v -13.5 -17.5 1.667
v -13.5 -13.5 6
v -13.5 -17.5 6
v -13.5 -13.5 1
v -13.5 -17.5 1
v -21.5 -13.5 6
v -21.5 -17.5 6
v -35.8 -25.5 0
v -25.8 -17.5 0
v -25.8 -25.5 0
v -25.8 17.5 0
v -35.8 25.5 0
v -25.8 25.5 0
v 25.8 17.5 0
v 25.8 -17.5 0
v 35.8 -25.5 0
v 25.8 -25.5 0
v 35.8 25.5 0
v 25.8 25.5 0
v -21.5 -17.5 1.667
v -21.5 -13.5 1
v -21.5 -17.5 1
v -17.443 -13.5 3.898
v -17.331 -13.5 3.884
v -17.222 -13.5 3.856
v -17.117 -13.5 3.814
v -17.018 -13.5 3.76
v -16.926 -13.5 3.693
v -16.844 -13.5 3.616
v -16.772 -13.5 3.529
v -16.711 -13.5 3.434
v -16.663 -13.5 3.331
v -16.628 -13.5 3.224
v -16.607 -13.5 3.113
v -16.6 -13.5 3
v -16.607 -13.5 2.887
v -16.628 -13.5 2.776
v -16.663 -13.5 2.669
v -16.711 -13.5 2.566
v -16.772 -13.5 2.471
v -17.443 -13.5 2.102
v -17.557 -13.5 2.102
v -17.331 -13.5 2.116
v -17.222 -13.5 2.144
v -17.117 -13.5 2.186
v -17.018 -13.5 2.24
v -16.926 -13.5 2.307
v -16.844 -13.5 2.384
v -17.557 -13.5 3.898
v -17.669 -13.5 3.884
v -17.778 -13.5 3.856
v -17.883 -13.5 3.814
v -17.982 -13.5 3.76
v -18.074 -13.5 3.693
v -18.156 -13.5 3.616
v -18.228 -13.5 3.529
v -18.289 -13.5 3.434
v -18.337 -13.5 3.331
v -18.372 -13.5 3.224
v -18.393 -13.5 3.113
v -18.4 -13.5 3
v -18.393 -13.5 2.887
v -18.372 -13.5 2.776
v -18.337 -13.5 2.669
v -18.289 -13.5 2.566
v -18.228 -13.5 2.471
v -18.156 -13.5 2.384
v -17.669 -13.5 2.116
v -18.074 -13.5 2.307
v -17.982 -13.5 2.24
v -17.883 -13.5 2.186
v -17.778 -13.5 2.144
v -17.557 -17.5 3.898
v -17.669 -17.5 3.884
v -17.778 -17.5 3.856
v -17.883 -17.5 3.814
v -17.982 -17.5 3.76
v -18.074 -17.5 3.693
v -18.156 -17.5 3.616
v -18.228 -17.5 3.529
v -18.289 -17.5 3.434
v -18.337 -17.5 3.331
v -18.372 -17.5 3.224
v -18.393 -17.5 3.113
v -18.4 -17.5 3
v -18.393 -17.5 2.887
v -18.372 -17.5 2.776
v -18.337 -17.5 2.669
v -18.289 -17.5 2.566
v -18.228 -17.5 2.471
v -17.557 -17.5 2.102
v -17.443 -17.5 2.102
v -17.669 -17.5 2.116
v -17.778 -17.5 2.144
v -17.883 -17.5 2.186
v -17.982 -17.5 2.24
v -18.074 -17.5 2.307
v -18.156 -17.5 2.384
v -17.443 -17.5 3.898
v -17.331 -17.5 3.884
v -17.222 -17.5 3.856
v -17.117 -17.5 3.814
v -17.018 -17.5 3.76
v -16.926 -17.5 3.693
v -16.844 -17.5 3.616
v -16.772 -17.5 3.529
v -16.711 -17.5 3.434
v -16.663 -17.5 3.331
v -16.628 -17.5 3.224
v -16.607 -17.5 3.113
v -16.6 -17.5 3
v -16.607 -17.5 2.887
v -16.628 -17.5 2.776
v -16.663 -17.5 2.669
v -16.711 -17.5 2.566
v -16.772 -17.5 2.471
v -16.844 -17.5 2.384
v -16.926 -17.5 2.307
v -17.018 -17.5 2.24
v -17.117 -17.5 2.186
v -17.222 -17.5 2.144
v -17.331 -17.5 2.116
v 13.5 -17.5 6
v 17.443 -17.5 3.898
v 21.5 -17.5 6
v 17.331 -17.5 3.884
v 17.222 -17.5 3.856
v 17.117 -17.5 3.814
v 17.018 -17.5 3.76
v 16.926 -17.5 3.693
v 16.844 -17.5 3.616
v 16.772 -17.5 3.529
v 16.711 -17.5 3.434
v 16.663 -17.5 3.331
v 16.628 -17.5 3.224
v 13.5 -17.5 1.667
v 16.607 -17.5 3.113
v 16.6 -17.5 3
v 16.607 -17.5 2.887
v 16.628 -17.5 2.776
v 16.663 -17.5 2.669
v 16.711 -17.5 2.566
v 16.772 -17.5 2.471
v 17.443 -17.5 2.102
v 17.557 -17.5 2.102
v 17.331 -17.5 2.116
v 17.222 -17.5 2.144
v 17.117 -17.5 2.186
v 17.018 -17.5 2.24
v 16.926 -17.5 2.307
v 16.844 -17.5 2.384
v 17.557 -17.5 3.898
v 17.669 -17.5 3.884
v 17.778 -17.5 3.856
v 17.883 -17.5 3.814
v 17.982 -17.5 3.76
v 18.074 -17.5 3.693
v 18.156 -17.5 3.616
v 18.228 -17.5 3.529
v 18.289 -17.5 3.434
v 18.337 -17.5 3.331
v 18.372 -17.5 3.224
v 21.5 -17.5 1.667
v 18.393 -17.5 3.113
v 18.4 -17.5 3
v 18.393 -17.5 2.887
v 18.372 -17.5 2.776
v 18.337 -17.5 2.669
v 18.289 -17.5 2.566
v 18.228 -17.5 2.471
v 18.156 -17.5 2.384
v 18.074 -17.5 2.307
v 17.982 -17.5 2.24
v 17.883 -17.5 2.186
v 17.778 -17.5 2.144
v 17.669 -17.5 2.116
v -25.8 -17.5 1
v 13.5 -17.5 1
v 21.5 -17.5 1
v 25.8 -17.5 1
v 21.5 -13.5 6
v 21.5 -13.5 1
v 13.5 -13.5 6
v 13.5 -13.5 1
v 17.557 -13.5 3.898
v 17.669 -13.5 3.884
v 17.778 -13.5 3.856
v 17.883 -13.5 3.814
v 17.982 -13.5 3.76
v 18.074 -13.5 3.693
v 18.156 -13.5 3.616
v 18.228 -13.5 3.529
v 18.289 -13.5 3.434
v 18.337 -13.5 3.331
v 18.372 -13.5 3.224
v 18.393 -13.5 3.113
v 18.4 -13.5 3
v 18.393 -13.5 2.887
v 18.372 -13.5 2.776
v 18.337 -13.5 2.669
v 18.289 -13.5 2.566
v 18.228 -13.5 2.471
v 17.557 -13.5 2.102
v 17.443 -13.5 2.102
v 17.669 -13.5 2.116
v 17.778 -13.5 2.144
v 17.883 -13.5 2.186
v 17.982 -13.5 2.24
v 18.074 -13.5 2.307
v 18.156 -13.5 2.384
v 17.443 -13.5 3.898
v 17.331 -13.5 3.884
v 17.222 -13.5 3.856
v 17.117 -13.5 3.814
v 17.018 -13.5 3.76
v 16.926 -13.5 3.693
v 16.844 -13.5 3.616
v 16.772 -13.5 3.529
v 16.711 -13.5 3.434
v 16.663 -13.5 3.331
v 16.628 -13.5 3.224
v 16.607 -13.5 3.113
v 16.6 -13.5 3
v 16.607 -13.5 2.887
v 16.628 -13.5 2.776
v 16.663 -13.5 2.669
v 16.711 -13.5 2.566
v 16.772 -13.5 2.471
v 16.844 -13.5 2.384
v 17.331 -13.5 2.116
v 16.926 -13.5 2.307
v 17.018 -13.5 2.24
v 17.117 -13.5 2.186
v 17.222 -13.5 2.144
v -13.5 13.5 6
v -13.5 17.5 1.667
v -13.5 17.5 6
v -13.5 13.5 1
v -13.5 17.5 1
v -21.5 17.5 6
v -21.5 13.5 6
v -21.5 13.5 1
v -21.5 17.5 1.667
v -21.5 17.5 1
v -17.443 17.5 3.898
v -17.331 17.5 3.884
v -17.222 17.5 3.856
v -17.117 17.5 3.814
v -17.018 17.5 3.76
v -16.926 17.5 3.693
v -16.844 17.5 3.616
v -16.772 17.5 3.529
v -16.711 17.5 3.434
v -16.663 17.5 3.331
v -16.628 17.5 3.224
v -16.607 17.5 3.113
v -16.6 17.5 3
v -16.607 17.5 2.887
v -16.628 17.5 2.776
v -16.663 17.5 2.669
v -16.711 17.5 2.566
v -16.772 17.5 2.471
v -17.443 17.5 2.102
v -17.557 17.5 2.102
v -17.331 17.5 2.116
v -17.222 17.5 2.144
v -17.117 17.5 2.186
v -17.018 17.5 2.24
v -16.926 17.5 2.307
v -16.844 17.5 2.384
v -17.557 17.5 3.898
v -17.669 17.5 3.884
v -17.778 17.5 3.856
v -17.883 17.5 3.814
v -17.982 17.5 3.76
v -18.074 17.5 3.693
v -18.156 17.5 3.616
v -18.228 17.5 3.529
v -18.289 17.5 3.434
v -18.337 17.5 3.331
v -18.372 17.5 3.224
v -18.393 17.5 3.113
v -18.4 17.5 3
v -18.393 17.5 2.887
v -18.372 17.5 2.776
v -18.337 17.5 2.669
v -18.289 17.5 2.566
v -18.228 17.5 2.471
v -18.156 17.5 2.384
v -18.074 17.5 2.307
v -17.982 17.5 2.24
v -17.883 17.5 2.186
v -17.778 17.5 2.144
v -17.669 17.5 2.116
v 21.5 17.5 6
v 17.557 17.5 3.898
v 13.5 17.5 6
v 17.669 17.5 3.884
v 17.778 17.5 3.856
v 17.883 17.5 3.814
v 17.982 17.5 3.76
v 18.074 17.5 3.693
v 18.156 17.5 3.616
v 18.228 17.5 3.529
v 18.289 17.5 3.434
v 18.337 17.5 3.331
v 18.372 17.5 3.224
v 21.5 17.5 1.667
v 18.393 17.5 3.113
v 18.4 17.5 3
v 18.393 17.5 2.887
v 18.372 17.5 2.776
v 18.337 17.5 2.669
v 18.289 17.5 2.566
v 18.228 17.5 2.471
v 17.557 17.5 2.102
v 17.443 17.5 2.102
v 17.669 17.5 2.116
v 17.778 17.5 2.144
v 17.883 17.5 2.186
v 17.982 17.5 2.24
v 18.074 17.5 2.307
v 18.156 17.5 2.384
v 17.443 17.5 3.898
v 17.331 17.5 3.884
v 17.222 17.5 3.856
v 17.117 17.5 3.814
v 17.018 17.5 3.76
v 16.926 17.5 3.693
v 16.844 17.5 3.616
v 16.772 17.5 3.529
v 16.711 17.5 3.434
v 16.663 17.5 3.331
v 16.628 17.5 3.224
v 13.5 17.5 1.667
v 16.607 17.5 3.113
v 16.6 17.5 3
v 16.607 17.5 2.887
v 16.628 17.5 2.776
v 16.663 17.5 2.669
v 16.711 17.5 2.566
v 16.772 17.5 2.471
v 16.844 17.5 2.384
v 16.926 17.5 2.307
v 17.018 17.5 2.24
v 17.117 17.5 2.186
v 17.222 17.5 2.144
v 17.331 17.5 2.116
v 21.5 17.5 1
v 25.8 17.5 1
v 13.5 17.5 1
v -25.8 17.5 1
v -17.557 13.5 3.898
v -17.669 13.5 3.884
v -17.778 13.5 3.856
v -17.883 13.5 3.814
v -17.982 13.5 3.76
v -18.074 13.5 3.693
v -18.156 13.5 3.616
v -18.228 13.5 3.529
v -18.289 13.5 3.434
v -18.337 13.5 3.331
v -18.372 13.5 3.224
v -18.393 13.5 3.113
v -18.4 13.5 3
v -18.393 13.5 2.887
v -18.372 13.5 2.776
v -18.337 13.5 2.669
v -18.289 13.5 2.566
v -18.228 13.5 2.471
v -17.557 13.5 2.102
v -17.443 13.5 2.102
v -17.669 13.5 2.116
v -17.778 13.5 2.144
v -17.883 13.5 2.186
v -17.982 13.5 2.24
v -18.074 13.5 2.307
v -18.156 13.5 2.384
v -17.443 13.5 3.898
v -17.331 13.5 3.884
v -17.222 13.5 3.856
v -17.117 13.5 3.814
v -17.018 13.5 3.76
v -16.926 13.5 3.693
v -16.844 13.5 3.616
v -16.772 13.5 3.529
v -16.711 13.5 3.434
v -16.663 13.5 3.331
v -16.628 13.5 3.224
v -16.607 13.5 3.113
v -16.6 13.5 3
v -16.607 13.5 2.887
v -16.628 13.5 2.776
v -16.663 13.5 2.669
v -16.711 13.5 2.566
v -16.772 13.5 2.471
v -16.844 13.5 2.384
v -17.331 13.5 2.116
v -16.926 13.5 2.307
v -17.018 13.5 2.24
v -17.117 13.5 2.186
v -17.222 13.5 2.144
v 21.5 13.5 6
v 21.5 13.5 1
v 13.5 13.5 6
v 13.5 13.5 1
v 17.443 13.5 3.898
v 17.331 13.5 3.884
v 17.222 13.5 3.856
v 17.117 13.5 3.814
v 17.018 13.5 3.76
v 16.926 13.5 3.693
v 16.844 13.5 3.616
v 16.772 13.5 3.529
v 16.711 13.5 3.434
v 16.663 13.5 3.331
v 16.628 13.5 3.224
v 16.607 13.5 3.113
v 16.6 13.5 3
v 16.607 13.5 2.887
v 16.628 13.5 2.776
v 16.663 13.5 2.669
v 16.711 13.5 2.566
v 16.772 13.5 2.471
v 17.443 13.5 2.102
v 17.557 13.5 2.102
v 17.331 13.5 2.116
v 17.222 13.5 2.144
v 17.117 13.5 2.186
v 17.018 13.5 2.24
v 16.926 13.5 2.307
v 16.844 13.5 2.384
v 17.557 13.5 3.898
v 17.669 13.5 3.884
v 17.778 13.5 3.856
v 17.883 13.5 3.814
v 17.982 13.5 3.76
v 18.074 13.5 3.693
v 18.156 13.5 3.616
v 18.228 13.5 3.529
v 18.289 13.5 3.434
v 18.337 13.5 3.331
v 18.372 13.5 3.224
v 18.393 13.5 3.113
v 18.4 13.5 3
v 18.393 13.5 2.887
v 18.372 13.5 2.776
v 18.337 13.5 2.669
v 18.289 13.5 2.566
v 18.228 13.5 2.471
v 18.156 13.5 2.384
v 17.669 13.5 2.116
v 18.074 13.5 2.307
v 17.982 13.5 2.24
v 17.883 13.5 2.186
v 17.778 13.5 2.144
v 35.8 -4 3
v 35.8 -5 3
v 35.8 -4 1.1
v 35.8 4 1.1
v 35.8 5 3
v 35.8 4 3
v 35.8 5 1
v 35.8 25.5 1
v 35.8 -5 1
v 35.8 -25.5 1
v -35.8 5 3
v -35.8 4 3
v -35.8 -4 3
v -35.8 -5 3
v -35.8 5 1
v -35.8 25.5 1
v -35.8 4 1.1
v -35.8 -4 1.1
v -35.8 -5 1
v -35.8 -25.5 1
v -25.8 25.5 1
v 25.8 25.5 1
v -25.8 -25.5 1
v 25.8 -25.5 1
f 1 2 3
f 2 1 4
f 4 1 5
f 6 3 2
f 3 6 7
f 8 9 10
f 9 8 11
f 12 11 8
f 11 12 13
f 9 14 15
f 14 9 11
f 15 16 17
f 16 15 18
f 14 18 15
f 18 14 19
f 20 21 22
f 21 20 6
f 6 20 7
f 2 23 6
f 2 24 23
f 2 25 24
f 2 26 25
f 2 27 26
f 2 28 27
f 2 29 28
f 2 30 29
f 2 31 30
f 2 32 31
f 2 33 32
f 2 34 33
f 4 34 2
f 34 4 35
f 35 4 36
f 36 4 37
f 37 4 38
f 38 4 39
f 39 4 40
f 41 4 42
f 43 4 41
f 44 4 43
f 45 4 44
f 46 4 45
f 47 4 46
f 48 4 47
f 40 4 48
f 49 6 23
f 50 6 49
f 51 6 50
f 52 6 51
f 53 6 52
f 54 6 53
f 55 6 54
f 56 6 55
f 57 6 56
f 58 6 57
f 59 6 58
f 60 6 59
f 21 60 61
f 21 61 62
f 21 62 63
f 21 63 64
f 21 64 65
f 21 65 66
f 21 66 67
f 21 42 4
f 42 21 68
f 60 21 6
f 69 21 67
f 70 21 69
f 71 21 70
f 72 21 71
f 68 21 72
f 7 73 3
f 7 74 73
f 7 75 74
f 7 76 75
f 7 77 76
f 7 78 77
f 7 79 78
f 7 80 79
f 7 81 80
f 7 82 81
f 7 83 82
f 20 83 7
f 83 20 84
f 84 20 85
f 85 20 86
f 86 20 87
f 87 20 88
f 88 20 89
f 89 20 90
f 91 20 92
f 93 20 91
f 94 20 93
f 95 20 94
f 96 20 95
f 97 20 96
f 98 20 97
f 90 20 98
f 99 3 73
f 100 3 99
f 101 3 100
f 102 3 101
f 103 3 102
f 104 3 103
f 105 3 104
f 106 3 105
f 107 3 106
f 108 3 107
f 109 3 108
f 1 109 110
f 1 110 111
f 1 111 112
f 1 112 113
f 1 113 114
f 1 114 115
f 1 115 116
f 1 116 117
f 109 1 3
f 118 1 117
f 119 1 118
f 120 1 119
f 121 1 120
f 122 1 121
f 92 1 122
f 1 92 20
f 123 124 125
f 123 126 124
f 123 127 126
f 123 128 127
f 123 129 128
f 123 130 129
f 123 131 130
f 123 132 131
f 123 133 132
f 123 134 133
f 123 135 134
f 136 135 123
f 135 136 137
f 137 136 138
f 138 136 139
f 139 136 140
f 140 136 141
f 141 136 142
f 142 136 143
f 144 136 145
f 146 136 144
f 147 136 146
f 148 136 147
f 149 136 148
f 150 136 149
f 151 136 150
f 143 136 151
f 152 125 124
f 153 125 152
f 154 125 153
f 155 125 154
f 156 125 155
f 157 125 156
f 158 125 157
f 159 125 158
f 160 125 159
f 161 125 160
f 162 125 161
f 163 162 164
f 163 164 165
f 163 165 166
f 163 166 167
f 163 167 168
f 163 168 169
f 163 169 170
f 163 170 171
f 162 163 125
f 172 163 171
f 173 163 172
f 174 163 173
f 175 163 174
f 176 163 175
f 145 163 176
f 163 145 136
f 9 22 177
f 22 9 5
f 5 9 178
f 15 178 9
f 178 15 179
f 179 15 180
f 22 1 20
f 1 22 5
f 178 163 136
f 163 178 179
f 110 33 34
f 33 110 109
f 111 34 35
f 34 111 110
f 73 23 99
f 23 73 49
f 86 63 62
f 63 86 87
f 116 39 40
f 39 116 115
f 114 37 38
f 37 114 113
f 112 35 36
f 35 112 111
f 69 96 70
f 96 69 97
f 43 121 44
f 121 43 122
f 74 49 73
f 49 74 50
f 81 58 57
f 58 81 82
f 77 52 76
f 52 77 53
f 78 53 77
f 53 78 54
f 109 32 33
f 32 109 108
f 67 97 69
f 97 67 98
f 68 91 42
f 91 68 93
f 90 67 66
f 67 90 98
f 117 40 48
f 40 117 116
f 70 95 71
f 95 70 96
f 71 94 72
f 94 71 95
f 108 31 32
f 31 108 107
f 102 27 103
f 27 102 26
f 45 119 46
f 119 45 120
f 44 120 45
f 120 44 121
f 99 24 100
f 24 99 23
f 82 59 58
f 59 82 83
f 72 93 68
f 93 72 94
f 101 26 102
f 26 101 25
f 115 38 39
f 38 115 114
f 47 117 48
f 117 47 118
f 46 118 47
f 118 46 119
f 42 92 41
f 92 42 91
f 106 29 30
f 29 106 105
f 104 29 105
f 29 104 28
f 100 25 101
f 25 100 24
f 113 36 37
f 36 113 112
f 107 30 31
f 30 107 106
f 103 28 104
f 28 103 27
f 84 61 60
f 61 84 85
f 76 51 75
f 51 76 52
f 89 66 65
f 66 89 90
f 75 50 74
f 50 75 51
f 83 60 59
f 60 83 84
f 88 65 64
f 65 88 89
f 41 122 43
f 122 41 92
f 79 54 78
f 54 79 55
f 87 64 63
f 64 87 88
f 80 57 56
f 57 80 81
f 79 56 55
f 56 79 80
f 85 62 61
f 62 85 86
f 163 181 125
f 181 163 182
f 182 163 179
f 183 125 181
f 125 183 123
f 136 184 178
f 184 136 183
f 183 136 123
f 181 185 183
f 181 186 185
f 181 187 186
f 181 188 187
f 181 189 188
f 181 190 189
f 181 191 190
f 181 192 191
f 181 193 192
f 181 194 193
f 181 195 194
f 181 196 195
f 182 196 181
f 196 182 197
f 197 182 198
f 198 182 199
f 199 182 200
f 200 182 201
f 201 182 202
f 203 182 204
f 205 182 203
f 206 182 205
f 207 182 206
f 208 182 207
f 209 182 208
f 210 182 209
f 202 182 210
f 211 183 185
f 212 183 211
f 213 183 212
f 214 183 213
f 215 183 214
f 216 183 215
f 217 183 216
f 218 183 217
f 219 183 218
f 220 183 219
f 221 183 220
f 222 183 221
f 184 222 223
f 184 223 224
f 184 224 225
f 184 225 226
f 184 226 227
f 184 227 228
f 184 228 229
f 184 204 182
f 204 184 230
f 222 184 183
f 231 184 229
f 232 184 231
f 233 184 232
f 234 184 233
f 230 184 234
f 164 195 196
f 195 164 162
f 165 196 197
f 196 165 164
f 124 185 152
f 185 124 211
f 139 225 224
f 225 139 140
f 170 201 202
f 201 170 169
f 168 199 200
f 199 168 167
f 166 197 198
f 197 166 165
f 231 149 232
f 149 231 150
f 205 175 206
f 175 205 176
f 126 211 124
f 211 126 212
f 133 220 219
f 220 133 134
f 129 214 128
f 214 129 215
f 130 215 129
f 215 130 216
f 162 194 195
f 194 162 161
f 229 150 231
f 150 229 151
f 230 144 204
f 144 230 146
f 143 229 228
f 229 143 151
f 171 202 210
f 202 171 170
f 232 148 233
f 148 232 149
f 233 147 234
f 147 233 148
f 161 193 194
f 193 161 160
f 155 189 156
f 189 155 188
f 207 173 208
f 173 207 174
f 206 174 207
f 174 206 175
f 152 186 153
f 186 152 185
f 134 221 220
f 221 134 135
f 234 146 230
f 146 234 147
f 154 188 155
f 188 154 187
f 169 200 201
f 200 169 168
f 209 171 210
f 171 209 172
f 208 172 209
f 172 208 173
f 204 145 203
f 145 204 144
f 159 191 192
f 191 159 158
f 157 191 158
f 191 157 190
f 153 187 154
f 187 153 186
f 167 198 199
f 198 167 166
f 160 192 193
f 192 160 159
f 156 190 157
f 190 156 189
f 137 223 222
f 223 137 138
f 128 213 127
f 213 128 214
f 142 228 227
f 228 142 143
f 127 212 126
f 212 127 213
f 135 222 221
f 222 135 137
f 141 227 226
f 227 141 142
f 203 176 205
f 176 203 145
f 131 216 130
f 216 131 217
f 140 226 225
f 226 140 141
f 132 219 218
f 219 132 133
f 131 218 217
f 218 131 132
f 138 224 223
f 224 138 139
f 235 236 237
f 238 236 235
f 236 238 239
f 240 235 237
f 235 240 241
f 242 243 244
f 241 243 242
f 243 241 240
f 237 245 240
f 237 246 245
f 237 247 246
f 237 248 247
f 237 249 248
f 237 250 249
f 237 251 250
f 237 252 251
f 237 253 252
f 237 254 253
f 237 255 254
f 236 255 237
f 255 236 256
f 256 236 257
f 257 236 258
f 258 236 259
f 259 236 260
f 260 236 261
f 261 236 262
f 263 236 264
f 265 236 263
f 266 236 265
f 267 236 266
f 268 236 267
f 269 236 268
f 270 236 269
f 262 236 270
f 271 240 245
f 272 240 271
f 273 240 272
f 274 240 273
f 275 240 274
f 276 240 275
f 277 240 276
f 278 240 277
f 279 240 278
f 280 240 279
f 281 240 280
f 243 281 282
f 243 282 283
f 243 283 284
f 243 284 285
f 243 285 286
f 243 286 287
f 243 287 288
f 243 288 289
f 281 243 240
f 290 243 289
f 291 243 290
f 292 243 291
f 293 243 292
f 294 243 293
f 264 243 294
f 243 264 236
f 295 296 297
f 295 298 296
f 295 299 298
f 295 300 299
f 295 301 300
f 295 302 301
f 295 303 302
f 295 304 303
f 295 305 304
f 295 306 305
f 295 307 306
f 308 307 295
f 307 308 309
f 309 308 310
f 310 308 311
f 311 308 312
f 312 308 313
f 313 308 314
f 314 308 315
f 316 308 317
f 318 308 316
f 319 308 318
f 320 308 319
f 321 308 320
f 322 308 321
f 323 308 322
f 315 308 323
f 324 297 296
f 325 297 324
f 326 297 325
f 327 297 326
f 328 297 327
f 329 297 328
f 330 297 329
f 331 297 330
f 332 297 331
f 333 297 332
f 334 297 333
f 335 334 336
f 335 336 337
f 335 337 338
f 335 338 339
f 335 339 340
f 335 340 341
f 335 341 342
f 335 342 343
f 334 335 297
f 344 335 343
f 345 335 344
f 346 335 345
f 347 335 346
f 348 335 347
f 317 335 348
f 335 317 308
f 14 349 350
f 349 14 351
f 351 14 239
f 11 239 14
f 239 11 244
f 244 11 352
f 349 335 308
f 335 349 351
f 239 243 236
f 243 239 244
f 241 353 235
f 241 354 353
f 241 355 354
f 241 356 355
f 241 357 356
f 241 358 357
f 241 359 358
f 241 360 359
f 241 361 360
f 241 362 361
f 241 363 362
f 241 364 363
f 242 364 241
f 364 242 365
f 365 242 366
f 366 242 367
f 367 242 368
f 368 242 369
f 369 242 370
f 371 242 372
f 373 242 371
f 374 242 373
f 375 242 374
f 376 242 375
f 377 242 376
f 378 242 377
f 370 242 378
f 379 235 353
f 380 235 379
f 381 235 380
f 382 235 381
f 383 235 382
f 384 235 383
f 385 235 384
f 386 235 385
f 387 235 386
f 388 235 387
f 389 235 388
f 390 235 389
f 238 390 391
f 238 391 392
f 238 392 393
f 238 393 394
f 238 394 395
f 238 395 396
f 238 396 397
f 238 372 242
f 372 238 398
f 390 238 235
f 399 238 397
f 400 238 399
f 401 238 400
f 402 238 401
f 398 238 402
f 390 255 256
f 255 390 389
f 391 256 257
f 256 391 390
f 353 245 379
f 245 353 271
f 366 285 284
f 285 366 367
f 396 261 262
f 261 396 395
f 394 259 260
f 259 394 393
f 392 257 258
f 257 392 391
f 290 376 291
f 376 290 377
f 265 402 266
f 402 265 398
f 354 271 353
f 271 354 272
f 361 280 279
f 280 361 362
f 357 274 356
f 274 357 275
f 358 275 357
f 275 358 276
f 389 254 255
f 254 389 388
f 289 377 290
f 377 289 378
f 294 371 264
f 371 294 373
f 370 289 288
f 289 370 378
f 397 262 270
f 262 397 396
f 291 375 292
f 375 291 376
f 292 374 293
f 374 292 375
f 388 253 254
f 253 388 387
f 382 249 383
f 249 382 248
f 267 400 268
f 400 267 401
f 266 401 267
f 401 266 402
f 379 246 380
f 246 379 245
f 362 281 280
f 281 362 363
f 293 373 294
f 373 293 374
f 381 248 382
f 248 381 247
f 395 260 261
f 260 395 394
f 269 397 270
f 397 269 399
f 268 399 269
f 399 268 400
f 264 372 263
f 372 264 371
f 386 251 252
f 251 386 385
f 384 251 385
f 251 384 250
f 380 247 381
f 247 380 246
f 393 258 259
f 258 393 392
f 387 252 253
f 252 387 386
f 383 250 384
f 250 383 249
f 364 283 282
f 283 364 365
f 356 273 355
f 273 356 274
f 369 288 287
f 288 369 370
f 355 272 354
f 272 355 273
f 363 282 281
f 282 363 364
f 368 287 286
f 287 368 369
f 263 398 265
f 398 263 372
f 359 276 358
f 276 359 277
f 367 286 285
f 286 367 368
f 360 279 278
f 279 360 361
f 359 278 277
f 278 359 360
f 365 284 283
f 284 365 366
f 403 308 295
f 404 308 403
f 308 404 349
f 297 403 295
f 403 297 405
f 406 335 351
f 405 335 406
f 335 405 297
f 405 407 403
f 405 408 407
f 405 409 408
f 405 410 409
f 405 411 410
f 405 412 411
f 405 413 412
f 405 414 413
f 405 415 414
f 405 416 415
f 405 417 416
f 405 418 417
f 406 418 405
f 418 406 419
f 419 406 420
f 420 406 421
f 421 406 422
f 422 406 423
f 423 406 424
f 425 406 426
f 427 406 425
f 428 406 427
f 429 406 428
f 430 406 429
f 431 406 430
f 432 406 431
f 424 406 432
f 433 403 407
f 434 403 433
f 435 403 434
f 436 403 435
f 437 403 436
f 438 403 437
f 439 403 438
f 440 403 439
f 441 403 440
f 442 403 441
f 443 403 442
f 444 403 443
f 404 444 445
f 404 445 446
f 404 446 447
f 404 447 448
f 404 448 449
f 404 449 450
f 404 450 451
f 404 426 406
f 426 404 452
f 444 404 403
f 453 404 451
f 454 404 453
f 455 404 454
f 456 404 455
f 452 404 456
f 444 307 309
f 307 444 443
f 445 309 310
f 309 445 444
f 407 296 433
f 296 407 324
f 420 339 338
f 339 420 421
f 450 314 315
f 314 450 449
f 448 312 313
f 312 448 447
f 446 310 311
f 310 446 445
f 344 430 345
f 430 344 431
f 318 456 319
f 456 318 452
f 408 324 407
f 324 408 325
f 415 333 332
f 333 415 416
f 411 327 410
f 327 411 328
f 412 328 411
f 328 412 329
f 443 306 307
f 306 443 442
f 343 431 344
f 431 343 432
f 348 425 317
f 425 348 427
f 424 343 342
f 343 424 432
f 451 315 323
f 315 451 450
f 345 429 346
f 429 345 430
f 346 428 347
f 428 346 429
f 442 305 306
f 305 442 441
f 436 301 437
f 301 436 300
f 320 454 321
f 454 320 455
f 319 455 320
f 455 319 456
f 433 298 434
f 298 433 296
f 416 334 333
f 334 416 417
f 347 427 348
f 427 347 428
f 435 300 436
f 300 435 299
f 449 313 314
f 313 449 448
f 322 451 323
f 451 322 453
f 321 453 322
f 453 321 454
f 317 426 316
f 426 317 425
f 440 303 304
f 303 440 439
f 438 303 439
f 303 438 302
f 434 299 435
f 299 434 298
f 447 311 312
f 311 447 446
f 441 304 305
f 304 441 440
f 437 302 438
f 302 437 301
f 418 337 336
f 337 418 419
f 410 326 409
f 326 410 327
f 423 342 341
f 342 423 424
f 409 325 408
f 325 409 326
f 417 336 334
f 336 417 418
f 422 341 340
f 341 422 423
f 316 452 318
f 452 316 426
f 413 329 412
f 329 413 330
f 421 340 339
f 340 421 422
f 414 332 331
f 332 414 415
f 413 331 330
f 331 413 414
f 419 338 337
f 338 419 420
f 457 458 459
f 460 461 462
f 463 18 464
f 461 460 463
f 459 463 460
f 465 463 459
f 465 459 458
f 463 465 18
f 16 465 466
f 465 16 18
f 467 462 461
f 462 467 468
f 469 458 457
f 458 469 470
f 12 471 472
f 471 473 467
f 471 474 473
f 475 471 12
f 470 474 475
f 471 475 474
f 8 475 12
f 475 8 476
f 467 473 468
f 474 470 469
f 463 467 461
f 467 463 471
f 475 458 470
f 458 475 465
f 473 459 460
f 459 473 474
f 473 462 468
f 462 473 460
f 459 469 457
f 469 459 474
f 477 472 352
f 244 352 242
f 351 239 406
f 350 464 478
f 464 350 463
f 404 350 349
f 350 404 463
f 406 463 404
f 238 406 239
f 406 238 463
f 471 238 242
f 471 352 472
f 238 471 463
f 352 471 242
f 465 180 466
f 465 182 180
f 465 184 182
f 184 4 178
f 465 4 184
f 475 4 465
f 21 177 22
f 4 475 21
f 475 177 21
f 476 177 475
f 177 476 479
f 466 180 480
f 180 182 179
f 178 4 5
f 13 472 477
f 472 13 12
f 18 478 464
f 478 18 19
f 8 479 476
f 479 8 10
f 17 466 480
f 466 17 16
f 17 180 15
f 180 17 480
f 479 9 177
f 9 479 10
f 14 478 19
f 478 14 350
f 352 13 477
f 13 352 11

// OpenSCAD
base_inner=51.6;
base_head_w=10;
base_head_h=8;
base_h=1;
base_w=51;
base_l=base_inner+2*base_head_w;

gorb_h = 2;
gorb_s = 1;
gorb_w = 8+gorb_s*2;

kat_h = 6;
kat_w = 8;
kat_g = 4;

add = 1;

pok = 27;
hole_r = 0.9;

$fn=50;

difference() {
	//main body
	union() {
		//base
		translate([-base_l/2,-base_w/2,0]) 
			cube([base_l, base_w ,base_h]);
			

		translate([-pok/2-kat_w,-base_w/2+base_head_h,0]) 
			difference() {
				cube([kat_w, kat_g ,kat_h]);
				translate([kat_w/2,kat_g/2,kat_h/2]) rotate(a=[90,0,0])
					 cylinder(h=kat_g+2, r=hole_r, center = true);

			}	
		translate([pok/2,-base_w/2+base_head_h,0]) 
			difference() {
				cube([kat_w, kat_g ,kat_h]);
				translate([kat_w/2,kat_g/2,kat_h/2]) rotate(a=[90,0,0])
					 cylinder(h=kat_g+2, r=hole_r, center = true);

			}	

		translate([-pok/2-kat_w,base_w/2-base_head_h-kat_g,0]) 
			difference() {
				cube([kat_w, kat_g ,kat_h]);
				translate([kat_w/2,kat_g/2,kat_h/2]) rotate(a=[90,0,0])
					 cylinder(h=kat_g+2, r=hole_r, center = true);

			}	
		translate([pok/2,base_w/2-base_head_h-kat_g,0]) 
			difference() {
				cube([kat_w, kat_g ,kat_h]);
				translate([kat_w/2,kat_g/2,kat_h/2]) rotate(a=[90,0,0])
					 cylinder(h=kat_g+2, r=hole_r, center = true);

			}	

		//gorb
		difference() {
			translate([-base_l/2,-gorb_w/2, 0]) 
				cube([base_l, gorb_w ,gorb_h+base_h]);	
	
			translate([-base_l/2-add,-(gorb_w-gorb_s*2)/2, base_h+0.1]) 
				cube([base_l+add*2, gorb_w-gorb_s*2 ,gorb_h+base_h]);				
		}
		
	}
	//left/righr diff
	translate([-base_l/2+base_head_w,-base_w/2-add, -base_h/3])
		cube([base_inner, base_head_h+add ,base_h*2]);

	translate([-base_l/2+base_head_w, base_w/2-base_head_h, -base_h/3])
		cube([base_inner, base_head_h+add ,base_h*2]);

}
